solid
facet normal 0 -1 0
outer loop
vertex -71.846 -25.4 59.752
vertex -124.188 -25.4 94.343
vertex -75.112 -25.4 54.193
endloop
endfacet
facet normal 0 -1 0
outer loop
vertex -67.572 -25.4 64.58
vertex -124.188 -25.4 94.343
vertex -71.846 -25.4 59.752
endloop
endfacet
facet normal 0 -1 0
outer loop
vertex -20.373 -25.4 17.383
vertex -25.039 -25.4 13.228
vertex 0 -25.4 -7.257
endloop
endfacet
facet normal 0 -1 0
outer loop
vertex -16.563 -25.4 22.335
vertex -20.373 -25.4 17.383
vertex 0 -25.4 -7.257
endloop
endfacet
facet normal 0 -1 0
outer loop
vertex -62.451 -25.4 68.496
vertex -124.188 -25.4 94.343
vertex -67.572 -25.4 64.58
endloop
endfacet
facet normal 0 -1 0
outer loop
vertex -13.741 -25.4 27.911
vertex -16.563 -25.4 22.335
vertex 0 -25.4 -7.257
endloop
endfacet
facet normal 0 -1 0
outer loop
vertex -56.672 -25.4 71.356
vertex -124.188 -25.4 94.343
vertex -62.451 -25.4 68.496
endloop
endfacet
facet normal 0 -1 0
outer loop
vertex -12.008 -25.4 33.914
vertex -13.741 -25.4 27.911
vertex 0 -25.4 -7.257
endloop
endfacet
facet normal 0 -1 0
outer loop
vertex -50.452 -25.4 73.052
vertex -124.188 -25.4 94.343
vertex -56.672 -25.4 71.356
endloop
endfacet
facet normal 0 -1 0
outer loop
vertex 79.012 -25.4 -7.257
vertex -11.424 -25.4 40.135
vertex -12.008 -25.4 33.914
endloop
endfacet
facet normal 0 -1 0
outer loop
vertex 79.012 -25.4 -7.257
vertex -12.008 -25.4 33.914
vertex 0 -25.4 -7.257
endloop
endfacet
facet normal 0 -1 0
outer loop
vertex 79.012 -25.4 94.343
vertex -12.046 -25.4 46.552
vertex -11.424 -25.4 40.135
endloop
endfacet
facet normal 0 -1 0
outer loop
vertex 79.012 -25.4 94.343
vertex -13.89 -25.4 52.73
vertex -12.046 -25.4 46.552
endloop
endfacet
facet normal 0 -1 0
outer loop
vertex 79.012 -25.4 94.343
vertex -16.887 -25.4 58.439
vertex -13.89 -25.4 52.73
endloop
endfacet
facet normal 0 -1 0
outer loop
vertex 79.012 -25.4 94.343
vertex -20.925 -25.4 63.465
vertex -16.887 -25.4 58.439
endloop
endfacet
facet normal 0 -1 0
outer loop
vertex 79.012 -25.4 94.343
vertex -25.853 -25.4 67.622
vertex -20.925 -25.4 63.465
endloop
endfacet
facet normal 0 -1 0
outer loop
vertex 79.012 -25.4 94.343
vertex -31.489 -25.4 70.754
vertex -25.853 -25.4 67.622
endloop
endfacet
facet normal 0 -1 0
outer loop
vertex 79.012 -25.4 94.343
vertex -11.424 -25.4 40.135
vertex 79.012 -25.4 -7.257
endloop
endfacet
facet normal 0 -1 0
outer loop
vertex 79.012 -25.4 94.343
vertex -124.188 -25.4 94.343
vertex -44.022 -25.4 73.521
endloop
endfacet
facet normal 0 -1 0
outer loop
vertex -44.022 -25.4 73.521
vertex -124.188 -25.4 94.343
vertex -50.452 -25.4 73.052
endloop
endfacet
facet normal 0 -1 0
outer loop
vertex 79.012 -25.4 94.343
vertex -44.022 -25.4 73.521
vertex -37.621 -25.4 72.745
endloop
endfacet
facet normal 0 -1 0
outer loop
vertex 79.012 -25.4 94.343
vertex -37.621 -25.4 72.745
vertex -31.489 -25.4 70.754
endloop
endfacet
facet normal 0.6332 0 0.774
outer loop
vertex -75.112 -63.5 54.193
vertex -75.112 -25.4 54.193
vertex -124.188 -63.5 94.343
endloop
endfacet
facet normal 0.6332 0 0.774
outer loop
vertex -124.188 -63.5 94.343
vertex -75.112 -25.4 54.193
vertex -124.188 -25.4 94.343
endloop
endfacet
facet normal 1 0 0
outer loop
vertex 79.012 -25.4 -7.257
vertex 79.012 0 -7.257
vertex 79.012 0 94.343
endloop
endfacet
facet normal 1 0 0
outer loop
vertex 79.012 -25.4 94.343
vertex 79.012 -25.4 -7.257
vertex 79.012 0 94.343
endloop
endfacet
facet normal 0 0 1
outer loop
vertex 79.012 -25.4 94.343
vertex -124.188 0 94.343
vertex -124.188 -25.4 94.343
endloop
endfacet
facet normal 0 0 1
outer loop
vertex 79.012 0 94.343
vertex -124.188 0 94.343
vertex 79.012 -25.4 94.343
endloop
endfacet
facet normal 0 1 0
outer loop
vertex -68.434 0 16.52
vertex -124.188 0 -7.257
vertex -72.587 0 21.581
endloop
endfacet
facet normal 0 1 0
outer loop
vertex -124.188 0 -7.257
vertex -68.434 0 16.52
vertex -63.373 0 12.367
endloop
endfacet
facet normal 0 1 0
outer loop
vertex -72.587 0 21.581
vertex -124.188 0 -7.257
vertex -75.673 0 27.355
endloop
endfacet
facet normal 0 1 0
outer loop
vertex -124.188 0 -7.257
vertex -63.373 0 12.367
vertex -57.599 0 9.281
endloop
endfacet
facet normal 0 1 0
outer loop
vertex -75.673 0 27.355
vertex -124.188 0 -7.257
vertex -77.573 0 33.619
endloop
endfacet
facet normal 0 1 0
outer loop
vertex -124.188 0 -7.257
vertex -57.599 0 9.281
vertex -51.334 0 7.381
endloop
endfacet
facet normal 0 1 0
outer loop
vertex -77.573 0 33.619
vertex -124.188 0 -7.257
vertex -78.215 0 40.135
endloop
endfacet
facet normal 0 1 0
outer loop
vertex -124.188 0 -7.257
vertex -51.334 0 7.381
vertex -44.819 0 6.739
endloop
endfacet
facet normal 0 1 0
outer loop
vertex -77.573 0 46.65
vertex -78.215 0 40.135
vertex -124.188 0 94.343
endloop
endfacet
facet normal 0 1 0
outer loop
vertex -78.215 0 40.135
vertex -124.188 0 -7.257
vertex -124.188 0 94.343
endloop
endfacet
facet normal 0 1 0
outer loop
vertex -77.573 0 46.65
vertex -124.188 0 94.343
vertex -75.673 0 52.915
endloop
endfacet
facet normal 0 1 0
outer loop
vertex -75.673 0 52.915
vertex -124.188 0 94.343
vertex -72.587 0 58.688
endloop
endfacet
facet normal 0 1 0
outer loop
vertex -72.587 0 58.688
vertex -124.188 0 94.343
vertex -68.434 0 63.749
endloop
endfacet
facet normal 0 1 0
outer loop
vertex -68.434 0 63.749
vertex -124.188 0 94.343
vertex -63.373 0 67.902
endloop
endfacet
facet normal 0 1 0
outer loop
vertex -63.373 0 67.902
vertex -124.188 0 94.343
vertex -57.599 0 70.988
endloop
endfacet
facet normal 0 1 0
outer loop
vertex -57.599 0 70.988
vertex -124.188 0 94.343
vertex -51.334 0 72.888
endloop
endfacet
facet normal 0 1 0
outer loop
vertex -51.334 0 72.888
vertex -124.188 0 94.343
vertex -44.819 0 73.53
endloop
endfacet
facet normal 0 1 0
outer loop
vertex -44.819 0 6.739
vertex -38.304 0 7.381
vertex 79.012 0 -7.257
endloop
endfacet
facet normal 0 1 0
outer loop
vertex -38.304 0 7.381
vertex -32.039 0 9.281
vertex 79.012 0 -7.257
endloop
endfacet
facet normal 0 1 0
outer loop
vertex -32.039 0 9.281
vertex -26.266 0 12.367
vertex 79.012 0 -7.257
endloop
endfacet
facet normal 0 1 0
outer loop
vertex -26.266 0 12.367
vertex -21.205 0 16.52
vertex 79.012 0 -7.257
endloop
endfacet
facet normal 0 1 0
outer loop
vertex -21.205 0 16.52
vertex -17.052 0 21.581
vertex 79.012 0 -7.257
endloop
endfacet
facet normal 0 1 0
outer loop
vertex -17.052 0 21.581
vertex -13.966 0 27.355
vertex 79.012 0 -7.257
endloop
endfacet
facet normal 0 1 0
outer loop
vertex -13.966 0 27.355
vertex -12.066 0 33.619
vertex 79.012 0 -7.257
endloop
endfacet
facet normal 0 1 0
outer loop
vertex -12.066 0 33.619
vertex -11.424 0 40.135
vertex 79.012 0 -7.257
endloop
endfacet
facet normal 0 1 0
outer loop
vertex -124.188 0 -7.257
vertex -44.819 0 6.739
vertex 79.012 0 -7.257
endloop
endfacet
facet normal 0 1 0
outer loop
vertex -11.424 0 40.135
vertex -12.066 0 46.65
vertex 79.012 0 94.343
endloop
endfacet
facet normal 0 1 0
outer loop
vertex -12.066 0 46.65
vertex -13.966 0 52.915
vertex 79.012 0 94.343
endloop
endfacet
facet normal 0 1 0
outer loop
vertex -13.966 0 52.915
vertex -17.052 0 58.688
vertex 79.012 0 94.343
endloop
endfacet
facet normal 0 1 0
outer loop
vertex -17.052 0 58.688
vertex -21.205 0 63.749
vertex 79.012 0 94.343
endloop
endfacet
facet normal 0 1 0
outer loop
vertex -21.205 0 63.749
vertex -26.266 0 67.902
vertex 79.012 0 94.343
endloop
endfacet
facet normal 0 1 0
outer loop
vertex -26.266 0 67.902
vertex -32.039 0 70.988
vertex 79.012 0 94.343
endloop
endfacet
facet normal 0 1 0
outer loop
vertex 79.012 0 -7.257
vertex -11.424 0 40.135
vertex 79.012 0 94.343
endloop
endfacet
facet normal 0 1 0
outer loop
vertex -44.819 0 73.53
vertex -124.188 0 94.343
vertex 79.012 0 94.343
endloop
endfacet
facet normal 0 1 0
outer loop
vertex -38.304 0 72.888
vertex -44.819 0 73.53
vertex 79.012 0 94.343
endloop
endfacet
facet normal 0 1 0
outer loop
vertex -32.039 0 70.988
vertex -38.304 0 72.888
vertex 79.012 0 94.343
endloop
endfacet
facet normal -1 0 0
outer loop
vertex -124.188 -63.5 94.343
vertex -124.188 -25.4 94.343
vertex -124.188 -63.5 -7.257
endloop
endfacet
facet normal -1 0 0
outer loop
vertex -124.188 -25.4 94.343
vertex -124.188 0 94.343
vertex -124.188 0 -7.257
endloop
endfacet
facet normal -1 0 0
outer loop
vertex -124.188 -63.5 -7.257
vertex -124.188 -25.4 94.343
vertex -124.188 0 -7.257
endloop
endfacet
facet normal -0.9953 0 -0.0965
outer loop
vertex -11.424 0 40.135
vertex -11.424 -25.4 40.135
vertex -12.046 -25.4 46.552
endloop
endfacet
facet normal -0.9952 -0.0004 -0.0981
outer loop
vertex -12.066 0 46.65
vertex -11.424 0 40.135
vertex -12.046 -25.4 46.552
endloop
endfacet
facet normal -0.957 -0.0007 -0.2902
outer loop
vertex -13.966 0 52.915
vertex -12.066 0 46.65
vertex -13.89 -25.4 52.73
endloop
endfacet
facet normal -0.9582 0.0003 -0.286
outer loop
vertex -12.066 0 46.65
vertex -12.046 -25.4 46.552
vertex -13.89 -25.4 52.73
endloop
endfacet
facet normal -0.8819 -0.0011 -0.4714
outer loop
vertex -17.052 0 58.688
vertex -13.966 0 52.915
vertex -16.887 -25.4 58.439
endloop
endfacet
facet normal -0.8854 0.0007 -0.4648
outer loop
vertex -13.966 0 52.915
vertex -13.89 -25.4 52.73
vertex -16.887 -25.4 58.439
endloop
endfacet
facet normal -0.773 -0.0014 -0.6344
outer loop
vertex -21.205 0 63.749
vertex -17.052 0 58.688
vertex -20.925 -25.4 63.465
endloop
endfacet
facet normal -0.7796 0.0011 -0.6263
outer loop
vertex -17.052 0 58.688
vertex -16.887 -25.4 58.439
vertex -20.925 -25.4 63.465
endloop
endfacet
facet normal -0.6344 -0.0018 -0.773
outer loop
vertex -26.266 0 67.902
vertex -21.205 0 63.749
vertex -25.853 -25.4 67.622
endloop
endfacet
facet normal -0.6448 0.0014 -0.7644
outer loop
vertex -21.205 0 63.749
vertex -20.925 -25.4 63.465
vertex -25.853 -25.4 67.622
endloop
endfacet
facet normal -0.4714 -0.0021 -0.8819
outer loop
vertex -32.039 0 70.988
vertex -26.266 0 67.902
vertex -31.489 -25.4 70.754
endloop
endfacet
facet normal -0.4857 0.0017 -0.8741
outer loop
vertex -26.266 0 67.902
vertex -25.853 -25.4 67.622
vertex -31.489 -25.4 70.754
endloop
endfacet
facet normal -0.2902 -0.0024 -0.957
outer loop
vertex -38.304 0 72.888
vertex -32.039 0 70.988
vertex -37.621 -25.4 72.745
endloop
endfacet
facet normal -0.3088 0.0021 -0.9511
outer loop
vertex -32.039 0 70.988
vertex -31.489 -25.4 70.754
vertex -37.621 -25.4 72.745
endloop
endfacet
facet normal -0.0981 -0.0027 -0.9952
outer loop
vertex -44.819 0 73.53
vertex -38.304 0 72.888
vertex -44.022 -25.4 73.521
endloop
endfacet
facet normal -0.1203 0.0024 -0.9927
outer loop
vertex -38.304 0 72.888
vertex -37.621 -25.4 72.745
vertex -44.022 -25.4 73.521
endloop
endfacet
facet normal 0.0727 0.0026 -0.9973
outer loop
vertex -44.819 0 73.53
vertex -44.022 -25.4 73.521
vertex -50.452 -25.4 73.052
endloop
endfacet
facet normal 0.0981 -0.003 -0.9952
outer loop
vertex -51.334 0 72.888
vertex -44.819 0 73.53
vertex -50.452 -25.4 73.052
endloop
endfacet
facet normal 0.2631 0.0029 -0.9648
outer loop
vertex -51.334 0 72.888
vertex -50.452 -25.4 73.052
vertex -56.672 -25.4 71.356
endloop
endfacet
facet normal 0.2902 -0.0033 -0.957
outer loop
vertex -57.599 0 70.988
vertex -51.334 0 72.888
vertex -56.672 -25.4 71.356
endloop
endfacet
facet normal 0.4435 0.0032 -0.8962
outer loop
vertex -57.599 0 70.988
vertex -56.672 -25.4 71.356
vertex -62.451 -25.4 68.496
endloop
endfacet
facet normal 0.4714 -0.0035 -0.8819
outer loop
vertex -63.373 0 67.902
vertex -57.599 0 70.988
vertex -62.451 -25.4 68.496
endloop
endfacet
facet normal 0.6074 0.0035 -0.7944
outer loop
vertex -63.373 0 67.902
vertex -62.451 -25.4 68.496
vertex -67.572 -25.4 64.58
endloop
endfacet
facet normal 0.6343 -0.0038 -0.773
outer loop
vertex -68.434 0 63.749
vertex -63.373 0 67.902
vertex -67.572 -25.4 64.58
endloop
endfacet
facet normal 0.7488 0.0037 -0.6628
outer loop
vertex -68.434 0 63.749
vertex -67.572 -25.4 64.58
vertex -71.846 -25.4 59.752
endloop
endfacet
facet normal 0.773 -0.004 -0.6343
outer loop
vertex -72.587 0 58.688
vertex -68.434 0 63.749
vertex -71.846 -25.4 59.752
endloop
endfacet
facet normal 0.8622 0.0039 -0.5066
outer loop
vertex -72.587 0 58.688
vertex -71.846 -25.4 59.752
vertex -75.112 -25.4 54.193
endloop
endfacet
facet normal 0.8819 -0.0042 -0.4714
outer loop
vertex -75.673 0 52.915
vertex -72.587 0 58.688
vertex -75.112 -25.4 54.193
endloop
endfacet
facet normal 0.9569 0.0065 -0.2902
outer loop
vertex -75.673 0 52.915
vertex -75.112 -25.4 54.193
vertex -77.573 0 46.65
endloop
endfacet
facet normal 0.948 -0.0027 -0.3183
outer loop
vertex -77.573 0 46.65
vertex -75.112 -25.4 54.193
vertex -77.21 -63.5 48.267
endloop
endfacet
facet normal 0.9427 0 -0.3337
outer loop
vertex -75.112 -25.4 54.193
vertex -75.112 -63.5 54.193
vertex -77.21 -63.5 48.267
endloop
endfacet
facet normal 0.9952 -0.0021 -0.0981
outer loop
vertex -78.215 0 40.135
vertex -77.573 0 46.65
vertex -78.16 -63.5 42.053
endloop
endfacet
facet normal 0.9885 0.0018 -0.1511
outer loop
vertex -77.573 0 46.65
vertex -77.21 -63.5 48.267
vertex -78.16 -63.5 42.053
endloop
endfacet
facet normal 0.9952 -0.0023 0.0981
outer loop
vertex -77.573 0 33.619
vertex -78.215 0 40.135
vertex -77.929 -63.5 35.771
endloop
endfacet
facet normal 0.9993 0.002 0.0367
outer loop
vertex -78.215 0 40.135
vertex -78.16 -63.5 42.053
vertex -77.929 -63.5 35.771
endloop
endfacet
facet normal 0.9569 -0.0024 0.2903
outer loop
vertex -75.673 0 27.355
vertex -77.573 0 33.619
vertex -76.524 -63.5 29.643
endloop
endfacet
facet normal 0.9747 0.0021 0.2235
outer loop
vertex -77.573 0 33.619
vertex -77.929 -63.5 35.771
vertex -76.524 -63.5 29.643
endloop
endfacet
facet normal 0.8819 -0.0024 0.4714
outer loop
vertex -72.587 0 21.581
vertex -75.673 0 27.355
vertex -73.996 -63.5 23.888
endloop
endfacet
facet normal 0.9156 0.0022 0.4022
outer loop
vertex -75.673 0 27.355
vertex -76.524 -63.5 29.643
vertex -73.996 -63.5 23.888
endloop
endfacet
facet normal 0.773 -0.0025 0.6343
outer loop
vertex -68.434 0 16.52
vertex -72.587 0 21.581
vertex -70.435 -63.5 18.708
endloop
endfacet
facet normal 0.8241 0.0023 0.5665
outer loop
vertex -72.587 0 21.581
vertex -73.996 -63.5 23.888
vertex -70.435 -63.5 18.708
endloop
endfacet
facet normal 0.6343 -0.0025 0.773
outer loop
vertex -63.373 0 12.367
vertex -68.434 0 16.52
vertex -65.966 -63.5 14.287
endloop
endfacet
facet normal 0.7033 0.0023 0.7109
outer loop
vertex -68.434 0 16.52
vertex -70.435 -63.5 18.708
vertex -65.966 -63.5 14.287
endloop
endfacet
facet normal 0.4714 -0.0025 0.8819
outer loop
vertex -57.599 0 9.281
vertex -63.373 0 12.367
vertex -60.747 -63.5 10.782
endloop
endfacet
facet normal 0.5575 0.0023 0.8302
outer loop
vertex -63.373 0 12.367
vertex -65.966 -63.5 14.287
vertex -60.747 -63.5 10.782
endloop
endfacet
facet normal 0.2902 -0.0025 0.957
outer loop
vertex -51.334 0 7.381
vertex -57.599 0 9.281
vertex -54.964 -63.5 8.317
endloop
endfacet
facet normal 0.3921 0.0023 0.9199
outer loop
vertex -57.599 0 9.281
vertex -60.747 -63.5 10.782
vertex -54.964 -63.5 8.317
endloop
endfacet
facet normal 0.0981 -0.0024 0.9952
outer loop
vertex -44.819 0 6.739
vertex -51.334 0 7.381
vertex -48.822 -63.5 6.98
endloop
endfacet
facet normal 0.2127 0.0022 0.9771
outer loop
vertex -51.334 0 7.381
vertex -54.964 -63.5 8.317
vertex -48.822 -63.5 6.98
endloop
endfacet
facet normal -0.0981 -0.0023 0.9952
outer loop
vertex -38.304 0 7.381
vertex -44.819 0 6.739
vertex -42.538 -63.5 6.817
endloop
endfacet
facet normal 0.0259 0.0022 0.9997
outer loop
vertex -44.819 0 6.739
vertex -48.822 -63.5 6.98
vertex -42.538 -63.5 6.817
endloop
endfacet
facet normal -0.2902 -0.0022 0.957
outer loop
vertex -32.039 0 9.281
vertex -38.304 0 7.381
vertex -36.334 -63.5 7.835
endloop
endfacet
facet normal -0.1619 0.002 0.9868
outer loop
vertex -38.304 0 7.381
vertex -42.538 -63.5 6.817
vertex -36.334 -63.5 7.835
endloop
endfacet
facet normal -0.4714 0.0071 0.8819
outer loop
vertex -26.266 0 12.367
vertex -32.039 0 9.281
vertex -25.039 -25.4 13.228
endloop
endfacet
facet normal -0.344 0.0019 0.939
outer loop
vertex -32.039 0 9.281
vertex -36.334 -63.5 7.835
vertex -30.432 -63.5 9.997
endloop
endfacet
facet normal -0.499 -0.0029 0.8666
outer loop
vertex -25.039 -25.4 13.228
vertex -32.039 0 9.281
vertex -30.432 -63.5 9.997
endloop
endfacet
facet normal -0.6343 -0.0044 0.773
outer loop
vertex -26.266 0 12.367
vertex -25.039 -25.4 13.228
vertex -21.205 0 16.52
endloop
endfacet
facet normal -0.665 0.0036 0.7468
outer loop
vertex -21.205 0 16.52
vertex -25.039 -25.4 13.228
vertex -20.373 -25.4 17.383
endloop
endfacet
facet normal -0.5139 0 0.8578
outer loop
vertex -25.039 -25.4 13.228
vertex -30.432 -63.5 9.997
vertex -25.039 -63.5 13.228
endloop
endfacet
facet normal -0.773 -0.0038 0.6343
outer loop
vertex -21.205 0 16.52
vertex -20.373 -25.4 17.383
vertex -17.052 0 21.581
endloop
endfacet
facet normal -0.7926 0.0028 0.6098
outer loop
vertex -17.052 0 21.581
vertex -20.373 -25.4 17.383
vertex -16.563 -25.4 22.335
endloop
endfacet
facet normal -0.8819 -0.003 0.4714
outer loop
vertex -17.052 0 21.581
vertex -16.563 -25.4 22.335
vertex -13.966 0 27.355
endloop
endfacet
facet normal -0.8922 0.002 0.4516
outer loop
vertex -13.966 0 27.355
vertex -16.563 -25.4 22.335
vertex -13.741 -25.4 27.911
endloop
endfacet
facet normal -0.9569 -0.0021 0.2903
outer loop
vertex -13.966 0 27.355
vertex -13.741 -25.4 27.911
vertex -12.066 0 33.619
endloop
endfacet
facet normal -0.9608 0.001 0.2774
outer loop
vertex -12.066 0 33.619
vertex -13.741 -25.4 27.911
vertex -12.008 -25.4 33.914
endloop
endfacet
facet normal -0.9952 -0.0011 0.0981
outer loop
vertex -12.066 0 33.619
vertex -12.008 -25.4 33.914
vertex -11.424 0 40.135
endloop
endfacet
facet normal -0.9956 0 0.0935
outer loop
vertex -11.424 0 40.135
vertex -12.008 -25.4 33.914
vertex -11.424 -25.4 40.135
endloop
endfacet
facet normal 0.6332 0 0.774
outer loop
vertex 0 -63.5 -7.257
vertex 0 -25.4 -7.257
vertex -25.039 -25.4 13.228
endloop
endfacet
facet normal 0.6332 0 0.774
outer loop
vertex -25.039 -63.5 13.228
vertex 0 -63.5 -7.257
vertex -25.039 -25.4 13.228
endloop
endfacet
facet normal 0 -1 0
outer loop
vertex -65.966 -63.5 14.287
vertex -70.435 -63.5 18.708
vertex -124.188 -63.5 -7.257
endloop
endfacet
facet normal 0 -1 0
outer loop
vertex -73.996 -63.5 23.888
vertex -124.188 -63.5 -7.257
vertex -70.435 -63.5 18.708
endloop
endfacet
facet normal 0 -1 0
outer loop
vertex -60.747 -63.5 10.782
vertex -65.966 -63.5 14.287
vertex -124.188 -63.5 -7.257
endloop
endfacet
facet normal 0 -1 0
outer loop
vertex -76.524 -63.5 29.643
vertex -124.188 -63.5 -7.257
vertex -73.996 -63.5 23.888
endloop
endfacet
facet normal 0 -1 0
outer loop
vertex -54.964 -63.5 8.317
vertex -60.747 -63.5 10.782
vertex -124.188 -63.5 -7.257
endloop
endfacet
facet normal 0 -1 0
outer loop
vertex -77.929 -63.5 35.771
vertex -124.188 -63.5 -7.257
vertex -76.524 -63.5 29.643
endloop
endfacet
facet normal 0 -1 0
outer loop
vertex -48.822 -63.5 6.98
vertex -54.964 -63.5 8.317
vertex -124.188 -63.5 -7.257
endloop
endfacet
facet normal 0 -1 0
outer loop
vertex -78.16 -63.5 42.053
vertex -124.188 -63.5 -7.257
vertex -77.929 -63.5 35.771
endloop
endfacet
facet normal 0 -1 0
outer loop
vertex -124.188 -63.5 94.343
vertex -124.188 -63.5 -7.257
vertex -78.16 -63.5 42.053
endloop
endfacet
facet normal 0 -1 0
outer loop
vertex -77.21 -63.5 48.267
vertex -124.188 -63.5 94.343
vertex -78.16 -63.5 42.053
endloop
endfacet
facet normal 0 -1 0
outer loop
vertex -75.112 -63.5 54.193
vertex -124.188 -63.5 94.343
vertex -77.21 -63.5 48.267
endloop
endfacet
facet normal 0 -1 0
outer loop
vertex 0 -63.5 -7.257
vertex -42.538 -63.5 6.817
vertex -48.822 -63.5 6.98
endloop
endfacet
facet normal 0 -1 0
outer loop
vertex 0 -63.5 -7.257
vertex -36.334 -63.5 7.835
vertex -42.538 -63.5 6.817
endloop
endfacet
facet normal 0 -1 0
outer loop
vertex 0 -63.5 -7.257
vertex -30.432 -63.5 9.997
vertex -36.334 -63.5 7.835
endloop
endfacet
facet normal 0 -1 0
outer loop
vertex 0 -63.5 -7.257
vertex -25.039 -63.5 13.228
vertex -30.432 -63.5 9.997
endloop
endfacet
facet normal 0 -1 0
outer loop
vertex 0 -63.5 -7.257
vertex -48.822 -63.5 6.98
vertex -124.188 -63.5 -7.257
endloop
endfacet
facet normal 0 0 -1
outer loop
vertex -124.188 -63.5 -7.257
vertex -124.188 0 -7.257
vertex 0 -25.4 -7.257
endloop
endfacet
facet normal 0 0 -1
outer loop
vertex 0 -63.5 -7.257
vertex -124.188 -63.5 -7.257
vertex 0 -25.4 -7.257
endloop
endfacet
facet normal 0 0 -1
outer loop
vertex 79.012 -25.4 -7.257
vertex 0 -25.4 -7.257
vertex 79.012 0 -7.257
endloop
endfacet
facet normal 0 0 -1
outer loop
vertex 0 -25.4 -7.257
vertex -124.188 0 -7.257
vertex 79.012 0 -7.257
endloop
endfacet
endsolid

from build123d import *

# Parameters (mm, degrees)
F0_W     = 203.2
F0_H     = 101.6
F1_DEPTH = 25.4
F3_DEPTH = 38.1
F4_R     = 33.39551
F5_DEPTH = 134.62


with BuildPart() as f1:
    # F0 (on Front) → F1 (new body)
    with BuildSketch(Plane.XZ):
        with Locations((-22.587857, 43.542857)):
            Rectangle(F0_W, F0_H)
    extrude(amount=F1_DEPTH)

    # F2 (on face) → F3 (join)
    with BuildSketch(Plane.XZ.offset(25.4)):
        Polygon((0, -7.257143), (-124.187857, 94.342857), (-124.187857, -7.257143), align=None)
    extrude(amount=F3_DEPTH)

    # F4 (on face) → F5 (cut)
    with BuildSketch(Plane.XZ.offset(63.5)):
        with Locations((-44.81934, 40.134594)):
            Circle(F4_R)
    extrude(amount=-F5_DEPTH, mode=Mode.SUBTRACT)


solid = f1.part
